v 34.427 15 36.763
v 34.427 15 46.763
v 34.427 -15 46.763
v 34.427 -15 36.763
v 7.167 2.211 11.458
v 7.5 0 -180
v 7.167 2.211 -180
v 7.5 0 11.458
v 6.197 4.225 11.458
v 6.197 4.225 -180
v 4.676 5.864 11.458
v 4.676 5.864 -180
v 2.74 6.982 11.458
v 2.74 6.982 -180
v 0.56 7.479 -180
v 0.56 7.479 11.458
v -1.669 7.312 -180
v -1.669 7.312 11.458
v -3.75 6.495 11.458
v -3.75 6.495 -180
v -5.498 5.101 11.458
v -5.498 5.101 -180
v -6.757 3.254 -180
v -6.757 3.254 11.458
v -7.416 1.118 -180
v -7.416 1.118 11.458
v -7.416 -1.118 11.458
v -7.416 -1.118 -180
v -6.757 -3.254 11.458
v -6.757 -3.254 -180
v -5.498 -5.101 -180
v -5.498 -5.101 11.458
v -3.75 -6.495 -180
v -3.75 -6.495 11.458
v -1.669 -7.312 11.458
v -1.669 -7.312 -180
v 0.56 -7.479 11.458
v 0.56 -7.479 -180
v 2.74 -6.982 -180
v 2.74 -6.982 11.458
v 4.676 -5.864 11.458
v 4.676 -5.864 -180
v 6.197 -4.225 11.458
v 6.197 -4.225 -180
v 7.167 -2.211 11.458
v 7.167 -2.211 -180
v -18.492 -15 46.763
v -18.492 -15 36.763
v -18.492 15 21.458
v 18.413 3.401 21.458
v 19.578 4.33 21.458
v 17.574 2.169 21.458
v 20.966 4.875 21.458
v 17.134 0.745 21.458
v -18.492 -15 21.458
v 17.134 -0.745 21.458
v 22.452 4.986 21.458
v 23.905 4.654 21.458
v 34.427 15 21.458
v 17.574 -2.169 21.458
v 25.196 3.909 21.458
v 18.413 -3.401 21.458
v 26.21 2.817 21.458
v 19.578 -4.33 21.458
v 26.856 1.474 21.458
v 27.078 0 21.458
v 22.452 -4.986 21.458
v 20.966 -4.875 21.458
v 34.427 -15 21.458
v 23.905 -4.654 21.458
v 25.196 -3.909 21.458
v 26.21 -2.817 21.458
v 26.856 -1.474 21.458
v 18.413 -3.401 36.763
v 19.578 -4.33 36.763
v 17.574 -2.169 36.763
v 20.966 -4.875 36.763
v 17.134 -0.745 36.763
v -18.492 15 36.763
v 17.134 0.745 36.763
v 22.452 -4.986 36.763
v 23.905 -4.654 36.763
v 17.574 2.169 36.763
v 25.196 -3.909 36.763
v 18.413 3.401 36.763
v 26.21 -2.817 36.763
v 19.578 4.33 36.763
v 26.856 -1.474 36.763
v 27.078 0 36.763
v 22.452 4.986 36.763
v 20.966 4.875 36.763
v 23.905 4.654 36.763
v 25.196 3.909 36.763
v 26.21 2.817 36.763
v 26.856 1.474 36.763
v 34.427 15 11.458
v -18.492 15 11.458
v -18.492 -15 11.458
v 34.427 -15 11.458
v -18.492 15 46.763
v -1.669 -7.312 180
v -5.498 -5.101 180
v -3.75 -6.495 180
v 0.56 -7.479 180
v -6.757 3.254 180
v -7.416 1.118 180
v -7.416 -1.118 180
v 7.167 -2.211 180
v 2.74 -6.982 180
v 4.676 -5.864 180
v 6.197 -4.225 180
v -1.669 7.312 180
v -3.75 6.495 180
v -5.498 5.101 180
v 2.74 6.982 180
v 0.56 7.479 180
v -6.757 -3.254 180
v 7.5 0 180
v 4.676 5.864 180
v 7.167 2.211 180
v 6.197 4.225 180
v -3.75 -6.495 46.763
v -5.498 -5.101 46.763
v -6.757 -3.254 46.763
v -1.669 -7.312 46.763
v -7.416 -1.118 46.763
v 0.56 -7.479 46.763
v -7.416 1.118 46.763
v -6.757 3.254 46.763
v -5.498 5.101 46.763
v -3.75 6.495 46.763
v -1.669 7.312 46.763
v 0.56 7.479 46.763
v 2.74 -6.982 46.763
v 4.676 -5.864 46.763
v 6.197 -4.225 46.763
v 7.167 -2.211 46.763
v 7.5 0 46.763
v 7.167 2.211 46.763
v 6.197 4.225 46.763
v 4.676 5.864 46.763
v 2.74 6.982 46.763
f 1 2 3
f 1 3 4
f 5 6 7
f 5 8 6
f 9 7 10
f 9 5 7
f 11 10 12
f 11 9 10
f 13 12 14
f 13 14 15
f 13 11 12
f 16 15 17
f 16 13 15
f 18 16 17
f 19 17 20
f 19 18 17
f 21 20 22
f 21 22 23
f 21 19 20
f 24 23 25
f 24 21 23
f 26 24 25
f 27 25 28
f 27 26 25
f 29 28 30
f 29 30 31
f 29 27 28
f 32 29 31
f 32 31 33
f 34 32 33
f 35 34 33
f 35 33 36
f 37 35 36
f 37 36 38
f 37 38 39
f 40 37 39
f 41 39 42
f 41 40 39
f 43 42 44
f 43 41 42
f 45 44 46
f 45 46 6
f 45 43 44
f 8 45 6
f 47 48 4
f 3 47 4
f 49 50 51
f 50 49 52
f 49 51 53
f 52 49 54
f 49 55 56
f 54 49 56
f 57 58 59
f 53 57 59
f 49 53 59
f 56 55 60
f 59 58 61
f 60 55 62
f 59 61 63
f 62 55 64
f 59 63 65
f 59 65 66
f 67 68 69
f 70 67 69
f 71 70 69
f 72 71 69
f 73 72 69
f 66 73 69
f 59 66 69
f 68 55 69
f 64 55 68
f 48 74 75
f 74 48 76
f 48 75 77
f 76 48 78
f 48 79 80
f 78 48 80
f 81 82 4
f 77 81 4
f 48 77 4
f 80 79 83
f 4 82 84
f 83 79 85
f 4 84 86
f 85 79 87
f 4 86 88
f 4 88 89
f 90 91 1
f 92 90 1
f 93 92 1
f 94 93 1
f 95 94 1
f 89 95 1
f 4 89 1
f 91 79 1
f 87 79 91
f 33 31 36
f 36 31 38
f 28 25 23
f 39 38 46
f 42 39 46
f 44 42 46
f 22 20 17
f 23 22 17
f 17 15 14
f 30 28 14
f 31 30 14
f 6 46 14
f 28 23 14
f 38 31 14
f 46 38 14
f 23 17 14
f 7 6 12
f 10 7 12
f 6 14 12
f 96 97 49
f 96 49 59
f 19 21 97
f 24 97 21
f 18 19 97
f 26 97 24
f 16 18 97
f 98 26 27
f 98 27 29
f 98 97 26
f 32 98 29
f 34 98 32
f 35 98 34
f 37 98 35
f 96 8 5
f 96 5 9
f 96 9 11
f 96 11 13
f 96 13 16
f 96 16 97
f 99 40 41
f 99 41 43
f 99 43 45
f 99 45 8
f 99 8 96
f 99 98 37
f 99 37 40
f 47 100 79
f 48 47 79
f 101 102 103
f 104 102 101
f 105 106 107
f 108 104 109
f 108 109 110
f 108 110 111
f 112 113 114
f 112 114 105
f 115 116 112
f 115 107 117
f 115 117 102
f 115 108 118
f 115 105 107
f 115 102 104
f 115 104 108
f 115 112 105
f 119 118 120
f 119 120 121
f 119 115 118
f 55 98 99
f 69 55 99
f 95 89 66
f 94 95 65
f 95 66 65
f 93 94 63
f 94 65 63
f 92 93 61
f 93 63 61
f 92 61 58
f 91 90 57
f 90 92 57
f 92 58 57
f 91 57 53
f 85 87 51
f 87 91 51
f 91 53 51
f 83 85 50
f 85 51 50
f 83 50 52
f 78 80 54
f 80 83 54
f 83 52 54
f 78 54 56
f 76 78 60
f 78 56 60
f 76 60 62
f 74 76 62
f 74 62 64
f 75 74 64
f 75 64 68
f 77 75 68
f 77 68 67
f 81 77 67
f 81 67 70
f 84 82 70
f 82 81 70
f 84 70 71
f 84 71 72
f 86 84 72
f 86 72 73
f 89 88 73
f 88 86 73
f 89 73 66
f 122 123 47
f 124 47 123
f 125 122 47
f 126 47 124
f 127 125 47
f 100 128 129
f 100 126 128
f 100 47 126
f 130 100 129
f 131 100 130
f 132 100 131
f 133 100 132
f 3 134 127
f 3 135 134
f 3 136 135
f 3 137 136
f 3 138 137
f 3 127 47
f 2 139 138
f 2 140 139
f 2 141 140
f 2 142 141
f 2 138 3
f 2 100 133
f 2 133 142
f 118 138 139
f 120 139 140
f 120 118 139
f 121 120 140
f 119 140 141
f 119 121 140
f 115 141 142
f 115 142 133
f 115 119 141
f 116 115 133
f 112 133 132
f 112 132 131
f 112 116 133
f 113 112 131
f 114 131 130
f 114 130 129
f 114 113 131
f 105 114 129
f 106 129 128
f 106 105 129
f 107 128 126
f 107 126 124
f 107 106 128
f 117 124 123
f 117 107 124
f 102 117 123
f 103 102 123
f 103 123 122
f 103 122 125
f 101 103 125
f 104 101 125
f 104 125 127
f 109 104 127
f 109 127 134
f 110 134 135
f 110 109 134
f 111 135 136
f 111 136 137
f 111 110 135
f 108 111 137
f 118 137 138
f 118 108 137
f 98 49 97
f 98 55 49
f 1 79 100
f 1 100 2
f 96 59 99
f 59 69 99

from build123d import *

# Parameters (mm, degrees)
SKETCH1_R           = 7.5
BOSS_EXTRUDE1_DEPTH = 180
SKETCH2_W           = 60
SKETCH2_H           = 25
CUT_EXTRUDE2_DEPTH  = 20
SKETCH3_W           = 52.918405924
SKETCH3_H           = 10
EXTRUDE_THIN1_DEPTH = 15
SKETCH4_R           = 5
BOSS_EXTRUDE2_DEPTH = 25


with BuildPart() as part:
    # Sketch1 → Boss-Extrude1 (new body, symmetric)
    with BuildSketch(Plane.XY):
        Circle(SKETCH1_R)
    extrude(amount=BOSS_EXTRUDE1_DEPTH, both=True)

    # Sketch2 → Cut-Extrude2 (cut, symmetric)
    with BuildSketch(Plane(origin=(0, 0, 0), x_dir=(1, 0, 0), z_dir=(0, 1, 0))):
        with Locations((14.409183819, -24.262804911)):
            Rectangle(SKETCH2_W, SKETCH2_H)
    extrude(amount=CUT_EXTRUDE2_DEPTH, both=True, mode=Mode.SUBTRACT)

    # Sketch3 → Extrude-Thin1 (add, symmetric)
    with BuildSketch(Plane(origin=(0, 0, 0), x_dir=(1, 0, 0), z_dir=(0, 1, 0))):
        with Locations((7.967689598, -16.457817956)):
            Rectangle(SKETCH3_W, SKETCH3_H)
        with Locations((7.967689598, -41.762804911)):
            Rectangle(SKETCH3_W, SKETCH3_H)
    extrude(amount=EXTRUDE_THIN1_DEPTH, both=True)

    # Sketch4 → Boss-Extrude2 (add)
    with BuildSketch(Plane.XY.offset(21.457817956)):
        with Locations((22.078448721, 0)):
            Circle(SKETCH4_R)
    extrude(amount=BOSS_EXTRUDE2_DEPTH)


solid = part.part
